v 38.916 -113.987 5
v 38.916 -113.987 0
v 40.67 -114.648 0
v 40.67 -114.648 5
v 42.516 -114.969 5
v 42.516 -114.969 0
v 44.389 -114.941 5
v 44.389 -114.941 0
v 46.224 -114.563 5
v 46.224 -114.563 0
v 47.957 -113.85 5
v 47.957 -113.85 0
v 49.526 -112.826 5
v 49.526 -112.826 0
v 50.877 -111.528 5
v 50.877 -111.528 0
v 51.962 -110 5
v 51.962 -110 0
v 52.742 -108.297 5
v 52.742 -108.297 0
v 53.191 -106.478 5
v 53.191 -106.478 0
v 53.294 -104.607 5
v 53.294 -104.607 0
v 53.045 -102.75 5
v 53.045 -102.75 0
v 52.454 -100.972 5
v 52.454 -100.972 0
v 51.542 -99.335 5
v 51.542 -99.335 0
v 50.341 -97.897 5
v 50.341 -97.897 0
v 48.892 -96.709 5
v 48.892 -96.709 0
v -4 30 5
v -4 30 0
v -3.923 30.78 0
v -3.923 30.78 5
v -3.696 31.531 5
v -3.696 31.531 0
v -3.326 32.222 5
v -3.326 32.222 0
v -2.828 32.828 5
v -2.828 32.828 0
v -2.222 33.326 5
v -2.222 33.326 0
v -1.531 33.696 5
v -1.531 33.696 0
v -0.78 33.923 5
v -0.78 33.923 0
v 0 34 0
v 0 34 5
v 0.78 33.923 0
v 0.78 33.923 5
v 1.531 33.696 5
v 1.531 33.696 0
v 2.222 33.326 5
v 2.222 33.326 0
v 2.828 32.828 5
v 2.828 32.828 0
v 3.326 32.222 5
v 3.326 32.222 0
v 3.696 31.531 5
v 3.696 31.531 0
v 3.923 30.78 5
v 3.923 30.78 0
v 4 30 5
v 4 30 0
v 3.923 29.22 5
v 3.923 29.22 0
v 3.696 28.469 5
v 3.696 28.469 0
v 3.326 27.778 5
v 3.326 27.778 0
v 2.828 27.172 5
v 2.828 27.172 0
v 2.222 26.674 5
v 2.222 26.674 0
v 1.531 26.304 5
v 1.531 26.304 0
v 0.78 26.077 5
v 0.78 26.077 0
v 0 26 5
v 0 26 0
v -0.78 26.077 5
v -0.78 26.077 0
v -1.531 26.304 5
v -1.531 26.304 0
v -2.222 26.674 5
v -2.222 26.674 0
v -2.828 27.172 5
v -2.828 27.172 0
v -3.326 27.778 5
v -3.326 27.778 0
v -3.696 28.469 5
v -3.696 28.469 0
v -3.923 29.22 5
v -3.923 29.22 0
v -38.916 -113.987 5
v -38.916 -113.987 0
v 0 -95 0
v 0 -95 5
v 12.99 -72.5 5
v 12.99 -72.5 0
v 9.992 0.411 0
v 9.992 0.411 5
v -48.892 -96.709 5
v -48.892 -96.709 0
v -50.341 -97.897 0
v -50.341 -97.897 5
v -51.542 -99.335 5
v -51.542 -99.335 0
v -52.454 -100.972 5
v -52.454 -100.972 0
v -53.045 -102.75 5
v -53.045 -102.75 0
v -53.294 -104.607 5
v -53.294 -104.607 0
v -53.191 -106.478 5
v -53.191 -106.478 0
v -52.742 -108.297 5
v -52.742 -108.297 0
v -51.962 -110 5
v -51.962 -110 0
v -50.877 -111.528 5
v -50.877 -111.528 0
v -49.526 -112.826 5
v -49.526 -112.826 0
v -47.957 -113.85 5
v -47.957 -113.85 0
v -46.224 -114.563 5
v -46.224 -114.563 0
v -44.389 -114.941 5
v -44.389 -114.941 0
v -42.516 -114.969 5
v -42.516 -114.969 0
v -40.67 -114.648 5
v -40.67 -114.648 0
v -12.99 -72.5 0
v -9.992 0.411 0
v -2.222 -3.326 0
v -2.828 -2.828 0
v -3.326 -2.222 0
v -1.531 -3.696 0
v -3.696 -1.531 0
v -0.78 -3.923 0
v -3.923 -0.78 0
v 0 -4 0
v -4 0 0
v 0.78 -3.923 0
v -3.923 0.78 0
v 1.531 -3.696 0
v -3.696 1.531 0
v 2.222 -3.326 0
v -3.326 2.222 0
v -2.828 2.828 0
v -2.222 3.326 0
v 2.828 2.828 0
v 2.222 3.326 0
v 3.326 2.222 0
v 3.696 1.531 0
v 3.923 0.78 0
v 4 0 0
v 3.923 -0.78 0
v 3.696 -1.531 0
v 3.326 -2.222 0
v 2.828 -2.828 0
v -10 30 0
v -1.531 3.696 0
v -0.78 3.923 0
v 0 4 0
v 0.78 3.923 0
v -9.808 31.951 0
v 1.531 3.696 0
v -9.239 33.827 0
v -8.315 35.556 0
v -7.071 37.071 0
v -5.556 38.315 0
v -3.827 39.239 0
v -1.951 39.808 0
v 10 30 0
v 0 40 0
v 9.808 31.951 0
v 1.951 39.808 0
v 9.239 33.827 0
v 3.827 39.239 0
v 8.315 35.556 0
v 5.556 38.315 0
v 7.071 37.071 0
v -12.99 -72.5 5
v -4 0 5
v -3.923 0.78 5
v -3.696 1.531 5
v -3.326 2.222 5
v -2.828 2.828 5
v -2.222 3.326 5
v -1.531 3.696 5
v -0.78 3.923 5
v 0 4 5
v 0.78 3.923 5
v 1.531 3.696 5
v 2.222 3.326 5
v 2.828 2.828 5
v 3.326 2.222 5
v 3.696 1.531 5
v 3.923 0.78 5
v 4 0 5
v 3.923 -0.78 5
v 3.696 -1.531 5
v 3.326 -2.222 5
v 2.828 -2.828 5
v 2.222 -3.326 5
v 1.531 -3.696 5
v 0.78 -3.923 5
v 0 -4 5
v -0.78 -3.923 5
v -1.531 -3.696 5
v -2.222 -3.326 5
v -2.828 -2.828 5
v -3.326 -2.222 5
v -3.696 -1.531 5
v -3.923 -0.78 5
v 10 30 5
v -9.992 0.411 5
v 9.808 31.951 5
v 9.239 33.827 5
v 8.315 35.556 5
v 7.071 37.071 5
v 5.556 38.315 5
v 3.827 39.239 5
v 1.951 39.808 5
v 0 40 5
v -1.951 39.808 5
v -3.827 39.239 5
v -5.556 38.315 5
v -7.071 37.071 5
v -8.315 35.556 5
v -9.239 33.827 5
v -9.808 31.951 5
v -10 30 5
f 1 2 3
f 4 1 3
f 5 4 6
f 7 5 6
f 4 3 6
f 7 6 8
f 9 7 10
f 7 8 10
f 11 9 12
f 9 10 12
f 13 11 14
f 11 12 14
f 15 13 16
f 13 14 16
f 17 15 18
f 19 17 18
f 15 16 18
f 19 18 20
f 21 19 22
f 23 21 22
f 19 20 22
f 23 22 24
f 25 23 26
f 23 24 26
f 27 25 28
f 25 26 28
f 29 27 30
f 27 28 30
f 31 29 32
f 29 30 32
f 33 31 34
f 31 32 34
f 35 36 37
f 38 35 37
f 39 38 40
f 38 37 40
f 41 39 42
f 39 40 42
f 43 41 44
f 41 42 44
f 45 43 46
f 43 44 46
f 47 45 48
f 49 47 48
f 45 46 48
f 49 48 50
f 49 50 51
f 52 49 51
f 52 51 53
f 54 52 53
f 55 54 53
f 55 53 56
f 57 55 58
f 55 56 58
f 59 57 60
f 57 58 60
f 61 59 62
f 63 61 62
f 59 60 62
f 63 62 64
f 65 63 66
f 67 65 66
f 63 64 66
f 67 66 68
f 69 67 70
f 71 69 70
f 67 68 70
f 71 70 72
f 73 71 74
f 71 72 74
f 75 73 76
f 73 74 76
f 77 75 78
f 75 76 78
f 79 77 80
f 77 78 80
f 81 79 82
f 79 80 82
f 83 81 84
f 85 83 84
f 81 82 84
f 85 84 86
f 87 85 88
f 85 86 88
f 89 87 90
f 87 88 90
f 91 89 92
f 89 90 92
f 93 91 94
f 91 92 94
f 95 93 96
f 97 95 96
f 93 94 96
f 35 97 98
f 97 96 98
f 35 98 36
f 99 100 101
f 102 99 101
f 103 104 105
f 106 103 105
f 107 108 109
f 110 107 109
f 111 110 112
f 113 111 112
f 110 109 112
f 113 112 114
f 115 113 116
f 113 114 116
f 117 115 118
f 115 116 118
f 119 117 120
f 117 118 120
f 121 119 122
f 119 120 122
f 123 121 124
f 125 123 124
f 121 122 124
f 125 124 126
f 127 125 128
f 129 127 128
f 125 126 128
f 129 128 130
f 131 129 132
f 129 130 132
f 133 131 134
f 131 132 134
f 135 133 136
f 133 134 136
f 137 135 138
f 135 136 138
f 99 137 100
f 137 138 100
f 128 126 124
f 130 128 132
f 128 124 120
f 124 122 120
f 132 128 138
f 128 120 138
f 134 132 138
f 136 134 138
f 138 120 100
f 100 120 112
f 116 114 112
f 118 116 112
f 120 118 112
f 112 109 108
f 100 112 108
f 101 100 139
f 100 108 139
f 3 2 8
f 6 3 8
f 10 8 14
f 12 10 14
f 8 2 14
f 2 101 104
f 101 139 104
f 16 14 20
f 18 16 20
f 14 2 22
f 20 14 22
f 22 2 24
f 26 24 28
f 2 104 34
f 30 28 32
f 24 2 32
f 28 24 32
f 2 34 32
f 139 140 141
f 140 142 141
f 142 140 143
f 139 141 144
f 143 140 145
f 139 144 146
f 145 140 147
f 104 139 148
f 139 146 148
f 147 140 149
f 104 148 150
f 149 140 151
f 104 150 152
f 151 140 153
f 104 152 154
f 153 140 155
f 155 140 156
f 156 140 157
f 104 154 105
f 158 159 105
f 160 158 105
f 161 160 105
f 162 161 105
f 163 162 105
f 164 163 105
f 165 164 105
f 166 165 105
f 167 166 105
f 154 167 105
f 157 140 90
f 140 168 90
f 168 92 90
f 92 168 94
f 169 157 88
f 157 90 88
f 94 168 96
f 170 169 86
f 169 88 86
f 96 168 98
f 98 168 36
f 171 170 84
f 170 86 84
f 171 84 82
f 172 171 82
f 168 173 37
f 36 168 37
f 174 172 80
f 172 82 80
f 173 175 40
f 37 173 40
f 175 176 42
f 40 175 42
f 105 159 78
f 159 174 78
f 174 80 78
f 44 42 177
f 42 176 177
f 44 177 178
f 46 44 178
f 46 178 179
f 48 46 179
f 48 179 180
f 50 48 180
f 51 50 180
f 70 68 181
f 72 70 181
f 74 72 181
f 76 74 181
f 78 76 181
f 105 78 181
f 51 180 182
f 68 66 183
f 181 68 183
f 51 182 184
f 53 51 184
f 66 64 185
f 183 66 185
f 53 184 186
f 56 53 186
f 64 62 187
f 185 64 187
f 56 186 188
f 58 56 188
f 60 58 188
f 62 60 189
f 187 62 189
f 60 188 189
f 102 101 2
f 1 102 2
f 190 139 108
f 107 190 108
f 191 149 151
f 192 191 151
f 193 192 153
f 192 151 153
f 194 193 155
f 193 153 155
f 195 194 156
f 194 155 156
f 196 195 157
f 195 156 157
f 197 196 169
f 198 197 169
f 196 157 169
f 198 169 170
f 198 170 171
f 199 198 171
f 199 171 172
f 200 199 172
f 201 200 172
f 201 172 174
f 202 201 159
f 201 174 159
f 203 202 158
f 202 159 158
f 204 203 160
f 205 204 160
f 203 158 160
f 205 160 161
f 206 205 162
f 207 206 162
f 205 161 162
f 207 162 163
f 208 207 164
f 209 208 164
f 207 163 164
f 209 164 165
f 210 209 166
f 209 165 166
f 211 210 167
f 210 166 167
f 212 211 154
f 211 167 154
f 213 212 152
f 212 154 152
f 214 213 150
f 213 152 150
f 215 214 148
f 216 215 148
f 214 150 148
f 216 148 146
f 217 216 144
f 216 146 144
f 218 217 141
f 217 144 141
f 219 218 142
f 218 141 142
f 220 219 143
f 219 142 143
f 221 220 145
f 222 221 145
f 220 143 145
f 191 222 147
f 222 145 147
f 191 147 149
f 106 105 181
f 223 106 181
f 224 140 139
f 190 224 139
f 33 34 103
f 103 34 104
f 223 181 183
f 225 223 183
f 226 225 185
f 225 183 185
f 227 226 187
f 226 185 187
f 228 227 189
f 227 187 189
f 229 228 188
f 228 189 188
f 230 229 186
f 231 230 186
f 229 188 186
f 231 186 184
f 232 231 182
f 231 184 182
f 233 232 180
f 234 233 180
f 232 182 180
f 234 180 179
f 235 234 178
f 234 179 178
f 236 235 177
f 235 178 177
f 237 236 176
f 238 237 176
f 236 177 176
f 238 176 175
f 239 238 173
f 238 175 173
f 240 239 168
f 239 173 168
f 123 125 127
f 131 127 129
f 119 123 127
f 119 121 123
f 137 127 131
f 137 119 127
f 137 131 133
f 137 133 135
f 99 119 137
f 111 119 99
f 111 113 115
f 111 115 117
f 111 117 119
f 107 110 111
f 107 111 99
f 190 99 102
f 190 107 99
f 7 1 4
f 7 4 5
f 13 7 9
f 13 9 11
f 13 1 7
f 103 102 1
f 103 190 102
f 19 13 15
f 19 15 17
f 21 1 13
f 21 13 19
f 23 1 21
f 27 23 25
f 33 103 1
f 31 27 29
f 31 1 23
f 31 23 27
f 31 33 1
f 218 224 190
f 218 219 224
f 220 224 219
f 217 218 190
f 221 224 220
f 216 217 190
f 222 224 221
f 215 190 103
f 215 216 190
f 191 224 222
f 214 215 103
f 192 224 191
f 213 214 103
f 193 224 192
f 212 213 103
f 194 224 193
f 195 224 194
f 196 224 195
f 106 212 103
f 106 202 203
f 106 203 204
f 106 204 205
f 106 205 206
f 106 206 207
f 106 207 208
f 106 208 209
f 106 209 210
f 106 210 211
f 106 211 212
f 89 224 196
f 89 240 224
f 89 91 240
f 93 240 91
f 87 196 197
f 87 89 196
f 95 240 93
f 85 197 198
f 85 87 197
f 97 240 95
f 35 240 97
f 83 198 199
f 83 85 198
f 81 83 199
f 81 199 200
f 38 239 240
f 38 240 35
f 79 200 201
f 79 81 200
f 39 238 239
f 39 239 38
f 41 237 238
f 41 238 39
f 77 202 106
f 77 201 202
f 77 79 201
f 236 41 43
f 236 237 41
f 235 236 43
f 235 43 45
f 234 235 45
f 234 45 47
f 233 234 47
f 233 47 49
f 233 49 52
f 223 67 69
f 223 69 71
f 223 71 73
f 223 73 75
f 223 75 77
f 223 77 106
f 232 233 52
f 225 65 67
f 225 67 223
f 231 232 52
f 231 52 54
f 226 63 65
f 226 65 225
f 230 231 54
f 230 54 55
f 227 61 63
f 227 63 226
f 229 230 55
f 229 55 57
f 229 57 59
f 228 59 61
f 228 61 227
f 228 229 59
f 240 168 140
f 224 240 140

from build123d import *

# Parameters (mm, degrees)
BOSS_EXTRUDE1_DEPTH = 5
SKETCH3_R           = 4
CUT_EXTRUDE1_DEPTH  = 5


with BuildPart() as part:
    # Sketch1 → Boss-Extrude1 (new body)
    with BuildSketch(Plane.XY):
        with BuildLine():
            Line((-38.916331436, -113.987341772), (0, -95))
            Line((0, -95), (38.916331436, -113.987341772))
            ThreePointArc((38.916331436, -113.987341772), (51.961524227, -110), (48.8920671, -96.708860759))
            Line((48.8920671, -96.708860759), (12.990381057, -72.5))
            Line((12.990381057, -72.5), (9.991552325, 0.410952718))
            Line((9.991552325, 0.410952718), (10, 30))
            ThreePointArc((10, 30), (0, 40), (-10, 30))
            Line((-10, 30), (-9.991552325, 0.410952718))
            Line((-9.991552325, 0.410952718), (-12.990381057, -72.5))
            Line((-12.990381057, -72.5), (-48.8920671, -96.708860759))
            ThreePointArc((-48.8920671, -96.708860759), (-51.961524227, -110), (-38.916331436, -113.987341772))
        make_face()
    extrude(amount=BOSS_EXTRUDE1_DEPTH)

    # Sketch3 → Cut-Extrude1 (cut)
    with BuildSketch(Plane(origin=(0, 0, 0), x_dir=(-1, 0, 0), z_dir=(0, 0, -1))):
        with Locations((0, 30)):
            Circle(SKETCH3_R)
        Circle(SKETCH3_R)
    extrude(amount=-CUT_EXTRUDE1_DEPTH, mode=Mode.SUBTRACT)


solid = part.part
